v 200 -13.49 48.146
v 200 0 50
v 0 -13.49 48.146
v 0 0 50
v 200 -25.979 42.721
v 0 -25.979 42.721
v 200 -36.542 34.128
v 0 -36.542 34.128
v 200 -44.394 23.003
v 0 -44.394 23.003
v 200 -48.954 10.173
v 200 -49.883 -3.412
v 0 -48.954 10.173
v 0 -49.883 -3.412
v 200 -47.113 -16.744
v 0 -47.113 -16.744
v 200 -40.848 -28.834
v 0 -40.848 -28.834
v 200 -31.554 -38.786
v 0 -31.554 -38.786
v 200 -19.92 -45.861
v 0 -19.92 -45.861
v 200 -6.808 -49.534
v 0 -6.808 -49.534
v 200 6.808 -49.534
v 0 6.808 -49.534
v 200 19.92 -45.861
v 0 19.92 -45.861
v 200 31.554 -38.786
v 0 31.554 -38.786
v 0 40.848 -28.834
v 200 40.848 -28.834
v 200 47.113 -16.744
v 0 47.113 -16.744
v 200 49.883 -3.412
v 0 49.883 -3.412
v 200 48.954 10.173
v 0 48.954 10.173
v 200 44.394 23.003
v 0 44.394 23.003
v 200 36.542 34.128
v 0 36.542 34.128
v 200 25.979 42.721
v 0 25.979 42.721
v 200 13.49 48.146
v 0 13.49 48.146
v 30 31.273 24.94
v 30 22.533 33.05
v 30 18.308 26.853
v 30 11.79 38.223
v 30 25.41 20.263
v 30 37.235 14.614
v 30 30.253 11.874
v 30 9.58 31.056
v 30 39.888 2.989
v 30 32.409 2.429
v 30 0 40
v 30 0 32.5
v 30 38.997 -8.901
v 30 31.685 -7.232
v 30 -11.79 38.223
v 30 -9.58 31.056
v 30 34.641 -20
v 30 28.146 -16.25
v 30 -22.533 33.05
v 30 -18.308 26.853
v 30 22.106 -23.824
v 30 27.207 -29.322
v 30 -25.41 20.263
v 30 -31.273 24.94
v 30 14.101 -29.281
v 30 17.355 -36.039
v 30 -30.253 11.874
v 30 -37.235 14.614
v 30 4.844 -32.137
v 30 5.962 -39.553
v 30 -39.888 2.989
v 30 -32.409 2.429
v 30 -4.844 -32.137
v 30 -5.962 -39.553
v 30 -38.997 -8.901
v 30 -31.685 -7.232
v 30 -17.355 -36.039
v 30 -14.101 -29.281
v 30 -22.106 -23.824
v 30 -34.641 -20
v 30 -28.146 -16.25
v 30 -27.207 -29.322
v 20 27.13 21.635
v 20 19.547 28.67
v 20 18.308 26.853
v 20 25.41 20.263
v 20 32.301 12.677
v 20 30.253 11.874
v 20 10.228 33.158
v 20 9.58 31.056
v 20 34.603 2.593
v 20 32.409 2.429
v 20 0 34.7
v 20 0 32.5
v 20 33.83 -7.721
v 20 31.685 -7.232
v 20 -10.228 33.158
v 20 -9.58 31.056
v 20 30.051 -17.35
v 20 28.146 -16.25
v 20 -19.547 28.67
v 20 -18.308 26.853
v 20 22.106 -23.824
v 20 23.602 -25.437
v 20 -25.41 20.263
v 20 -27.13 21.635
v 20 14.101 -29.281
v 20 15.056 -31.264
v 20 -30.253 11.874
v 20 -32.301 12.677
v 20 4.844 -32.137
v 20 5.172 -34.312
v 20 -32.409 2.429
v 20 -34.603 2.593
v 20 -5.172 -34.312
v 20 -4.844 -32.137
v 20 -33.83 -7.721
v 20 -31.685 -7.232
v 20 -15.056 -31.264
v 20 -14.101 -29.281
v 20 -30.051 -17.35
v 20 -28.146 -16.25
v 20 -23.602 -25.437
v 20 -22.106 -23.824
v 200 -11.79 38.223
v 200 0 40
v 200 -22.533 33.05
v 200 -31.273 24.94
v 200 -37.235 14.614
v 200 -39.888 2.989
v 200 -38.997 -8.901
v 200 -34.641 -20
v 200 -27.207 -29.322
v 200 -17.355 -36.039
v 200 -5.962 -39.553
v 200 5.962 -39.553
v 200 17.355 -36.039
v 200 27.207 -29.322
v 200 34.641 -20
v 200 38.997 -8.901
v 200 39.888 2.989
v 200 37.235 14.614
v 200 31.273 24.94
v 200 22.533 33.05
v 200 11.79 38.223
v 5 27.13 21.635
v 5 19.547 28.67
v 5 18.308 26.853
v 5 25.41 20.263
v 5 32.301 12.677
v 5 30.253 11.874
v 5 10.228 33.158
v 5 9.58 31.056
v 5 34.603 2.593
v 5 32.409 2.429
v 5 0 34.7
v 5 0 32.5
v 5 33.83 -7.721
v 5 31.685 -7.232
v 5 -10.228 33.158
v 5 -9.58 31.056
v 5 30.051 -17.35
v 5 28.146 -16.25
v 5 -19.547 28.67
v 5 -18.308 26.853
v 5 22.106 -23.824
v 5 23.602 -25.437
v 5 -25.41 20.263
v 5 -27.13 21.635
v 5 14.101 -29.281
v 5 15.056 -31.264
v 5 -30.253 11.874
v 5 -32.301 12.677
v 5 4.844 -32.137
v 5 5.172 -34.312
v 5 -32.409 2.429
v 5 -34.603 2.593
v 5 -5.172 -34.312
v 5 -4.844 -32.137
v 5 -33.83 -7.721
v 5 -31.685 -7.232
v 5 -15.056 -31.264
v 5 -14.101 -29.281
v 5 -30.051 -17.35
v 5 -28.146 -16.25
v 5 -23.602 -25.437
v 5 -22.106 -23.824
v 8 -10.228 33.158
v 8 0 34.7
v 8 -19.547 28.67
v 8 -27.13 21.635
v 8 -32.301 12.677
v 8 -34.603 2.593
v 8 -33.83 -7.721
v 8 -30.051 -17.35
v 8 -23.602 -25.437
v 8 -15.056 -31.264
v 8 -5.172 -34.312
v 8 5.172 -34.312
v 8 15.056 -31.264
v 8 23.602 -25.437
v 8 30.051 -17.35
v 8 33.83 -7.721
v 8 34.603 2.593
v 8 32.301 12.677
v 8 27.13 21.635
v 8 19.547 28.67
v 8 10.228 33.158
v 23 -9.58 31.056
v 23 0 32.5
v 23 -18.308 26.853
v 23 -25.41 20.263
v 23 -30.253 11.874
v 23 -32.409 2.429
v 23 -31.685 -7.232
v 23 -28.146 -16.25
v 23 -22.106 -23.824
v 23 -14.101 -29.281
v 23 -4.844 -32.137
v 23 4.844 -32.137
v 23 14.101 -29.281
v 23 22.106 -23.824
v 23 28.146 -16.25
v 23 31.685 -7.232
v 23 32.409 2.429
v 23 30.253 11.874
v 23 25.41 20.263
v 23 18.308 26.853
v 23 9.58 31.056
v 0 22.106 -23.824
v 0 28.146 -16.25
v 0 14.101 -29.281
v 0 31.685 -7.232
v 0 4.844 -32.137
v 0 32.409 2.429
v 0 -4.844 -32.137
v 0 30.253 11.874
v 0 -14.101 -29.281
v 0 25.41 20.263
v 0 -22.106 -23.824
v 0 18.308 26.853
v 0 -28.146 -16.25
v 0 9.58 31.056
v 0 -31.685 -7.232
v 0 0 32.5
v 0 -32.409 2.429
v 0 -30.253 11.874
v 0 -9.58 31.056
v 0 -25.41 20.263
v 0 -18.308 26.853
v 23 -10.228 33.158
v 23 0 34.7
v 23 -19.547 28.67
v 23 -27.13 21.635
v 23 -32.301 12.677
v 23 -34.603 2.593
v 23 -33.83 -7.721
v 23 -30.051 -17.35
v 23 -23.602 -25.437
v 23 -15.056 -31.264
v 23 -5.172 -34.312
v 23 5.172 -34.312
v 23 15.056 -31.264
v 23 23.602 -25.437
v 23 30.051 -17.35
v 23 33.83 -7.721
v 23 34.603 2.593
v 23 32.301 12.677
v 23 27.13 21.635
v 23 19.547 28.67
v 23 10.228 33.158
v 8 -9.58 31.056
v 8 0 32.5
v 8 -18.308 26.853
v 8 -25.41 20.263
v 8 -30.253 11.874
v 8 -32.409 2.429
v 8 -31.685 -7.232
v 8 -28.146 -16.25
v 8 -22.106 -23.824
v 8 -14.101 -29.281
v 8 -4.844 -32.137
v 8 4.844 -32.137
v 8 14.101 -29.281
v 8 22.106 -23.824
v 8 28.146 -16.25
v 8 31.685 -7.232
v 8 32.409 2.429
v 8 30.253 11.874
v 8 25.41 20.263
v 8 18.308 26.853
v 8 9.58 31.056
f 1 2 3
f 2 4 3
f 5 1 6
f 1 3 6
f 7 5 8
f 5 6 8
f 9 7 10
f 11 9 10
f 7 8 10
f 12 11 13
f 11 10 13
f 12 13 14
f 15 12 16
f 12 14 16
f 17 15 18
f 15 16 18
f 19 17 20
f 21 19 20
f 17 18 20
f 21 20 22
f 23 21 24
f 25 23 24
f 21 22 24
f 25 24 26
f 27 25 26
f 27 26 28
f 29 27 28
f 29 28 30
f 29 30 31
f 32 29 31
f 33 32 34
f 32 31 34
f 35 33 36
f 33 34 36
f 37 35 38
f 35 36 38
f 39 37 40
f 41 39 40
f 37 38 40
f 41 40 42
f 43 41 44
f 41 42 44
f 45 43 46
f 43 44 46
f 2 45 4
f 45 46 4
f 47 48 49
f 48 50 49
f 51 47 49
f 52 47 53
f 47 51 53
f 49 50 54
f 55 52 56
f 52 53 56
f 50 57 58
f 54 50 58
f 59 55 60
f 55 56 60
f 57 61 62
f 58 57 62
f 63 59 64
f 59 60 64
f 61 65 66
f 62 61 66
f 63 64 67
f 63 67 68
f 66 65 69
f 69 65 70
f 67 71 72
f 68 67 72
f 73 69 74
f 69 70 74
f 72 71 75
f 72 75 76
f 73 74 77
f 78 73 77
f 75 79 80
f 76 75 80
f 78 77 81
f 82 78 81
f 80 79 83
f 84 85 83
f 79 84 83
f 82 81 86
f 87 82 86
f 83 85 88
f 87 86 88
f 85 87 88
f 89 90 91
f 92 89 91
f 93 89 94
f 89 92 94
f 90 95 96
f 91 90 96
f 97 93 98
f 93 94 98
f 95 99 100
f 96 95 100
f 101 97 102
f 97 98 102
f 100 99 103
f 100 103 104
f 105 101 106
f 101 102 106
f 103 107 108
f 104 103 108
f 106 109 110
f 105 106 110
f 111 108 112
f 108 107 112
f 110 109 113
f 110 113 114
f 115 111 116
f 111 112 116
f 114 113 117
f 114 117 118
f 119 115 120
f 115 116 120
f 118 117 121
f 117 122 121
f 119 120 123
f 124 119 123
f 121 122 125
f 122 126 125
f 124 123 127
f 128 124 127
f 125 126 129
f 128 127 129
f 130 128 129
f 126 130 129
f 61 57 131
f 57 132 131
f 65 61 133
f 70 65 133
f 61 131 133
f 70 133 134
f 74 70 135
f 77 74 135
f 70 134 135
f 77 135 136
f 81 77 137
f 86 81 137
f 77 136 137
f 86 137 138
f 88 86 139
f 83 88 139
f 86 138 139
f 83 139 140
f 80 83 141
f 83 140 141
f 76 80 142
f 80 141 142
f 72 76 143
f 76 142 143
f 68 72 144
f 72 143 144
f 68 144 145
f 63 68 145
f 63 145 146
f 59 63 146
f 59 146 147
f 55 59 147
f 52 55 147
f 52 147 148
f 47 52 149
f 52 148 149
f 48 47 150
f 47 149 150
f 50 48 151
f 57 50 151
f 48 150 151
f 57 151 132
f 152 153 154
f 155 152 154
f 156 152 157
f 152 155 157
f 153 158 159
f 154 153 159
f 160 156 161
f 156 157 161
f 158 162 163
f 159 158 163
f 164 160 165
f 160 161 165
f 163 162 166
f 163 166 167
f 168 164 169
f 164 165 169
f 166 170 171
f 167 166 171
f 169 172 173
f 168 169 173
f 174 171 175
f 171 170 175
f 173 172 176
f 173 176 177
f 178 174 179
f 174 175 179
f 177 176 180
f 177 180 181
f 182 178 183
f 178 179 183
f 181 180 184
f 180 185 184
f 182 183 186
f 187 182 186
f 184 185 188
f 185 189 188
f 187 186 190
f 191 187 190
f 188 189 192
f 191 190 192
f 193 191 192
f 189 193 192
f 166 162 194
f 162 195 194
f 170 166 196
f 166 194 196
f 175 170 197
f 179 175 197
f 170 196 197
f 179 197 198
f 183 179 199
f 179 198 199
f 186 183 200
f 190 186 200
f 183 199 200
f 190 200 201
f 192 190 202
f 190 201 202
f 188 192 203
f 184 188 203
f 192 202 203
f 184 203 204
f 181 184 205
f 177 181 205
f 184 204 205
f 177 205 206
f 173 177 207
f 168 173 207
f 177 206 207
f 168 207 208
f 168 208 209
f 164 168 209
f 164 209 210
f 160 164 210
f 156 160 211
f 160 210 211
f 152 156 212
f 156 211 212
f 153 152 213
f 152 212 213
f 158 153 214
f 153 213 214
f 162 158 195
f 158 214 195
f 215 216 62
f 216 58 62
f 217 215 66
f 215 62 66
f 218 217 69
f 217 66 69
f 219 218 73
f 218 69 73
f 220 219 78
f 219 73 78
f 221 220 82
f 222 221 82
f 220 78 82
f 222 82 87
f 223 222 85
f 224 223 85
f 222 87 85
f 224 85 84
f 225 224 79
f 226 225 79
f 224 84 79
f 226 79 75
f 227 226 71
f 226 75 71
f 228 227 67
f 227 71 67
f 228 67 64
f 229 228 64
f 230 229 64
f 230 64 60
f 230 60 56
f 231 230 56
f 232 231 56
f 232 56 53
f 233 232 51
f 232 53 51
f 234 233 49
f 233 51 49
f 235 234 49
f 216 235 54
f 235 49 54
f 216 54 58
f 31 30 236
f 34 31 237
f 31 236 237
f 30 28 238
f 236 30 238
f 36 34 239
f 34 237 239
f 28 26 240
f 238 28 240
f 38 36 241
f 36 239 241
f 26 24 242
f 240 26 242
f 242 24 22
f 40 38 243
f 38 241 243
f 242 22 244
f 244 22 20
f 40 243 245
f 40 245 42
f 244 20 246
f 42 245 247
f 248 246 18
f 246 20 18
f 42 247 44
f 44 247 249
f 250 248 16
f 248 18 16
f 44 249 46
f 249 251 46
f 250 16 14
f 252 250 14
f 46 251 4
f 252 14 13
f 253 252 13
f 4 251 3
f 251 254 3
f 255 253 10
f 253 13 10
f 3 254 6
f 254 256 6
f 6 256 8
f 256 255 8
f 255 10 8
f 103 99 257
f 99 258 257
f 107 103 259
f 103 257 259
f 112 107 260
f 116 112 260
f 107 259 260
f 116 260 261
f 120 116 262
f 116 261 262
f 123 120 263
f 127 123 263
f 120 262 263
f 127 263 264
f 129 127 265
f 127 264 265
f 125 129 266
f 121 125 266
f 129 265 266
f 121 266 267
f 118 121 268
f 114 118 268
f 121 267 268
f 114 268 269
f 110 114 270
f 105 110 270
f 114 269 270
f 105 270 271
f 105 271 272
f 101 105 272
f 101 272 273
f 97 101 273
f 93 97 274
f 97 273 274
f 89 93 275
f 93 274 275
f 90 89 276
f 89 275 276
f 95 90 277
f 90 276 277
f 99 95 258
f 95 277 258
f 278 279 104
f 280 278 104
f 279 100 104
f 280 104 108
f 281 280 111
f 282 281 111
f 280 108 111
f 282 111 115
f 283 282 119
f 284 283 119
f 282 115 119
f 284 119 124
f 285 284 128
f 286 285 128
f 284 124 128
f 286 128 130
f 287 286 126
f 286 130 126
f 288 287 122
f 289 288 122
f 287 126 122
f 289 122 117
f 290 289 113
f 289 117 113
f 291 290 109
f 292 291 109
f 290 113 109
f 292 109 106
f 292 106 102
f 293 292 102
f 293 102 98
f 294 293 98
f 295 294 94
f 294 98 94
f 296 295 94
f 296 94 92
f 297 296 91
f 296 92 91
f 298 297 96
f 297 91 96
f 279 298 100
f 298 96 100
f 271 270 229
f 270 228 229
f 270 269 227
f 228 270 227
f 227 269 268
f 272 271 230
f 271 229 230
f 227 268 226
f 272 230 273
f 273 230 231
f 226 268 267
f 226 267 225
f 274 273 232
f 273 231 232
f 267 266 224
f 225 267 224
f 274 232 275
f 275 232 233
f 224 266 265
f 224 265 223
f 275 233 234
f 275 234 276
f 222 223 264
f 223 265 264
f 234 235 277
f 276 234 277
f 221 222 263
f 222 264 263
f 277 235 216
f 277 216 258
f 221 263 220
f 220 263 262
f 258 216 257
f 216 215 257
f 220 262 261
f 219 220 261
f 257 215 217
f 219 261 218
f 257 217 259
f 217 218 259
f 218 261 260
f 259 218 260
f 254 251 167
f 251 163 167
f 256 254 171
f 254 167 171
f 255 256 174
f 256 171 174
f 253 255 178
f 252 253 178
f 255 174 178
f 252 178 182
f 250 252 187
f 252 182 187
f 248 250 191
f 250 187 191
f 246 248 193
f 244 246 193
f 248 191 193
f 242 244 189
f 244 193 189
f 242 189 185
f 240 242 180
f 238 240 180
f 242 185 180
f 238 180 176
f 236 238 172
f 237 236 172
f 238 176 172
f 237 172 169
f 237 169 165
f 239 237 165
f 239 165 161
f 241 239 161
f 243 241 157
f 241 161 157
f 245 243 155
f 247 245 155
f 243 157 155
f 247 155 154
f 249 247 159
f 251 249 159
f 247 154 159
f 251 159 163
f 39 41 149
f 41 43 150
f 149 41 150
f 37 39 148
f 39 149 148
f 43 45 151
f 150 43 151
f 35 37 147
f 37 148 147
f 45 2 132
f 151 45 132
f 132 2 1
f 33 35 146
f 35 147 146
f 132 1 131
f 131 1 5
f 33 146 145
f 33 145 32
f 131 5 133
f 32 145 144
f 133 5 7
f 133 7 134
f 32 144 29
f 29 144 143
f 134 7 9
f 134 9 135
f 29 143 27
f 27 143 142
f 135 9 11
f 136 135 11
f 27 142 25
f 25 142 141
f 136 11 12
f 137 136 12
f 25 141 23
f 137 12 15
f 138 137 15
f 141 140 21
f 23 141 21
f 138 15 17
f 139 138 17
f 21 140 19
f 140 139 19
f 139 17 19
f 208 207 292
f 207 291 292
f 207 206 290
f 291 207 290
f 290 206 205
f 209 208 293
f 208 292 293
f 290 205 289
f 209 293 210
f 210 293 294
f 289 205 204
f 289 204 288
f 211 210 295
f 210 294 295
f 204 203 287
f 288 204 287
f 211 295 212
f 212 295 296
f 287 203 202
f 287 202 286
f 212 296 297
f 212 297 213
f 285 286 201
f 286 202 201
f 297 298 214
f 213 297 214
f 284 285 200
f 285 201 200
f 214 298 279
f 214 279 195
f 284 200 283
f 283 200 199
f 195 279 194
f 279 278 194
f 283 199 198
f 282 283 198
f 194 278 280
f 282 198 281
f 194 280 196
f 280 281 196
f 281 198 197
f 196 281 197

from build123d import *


with BuildPart() as part:
    # Skizze1 → Rotation1 (revolve)
    with BuildSketch(Plane.XY, mode=Mode.PRIVATE) as rotation1_sk:
        Polygon((0, 50), (0, 32.5), (5, 32.5), (5, 34.7), (8, 34.7), (8, 32.5), (20, 32.5), (20, 34.7), (23, 34.7), (23, 32.5), (30, 32.5), (30, 40), (200, 40), (200, 50), align=None)
    revolve(rotation1_sk.sketch.rotate(Axis((0, 0, 0), (1, 0, 0)), 90), axis=Axis((0, 0, 0), (1, 0, 0)))


solid = part.part
